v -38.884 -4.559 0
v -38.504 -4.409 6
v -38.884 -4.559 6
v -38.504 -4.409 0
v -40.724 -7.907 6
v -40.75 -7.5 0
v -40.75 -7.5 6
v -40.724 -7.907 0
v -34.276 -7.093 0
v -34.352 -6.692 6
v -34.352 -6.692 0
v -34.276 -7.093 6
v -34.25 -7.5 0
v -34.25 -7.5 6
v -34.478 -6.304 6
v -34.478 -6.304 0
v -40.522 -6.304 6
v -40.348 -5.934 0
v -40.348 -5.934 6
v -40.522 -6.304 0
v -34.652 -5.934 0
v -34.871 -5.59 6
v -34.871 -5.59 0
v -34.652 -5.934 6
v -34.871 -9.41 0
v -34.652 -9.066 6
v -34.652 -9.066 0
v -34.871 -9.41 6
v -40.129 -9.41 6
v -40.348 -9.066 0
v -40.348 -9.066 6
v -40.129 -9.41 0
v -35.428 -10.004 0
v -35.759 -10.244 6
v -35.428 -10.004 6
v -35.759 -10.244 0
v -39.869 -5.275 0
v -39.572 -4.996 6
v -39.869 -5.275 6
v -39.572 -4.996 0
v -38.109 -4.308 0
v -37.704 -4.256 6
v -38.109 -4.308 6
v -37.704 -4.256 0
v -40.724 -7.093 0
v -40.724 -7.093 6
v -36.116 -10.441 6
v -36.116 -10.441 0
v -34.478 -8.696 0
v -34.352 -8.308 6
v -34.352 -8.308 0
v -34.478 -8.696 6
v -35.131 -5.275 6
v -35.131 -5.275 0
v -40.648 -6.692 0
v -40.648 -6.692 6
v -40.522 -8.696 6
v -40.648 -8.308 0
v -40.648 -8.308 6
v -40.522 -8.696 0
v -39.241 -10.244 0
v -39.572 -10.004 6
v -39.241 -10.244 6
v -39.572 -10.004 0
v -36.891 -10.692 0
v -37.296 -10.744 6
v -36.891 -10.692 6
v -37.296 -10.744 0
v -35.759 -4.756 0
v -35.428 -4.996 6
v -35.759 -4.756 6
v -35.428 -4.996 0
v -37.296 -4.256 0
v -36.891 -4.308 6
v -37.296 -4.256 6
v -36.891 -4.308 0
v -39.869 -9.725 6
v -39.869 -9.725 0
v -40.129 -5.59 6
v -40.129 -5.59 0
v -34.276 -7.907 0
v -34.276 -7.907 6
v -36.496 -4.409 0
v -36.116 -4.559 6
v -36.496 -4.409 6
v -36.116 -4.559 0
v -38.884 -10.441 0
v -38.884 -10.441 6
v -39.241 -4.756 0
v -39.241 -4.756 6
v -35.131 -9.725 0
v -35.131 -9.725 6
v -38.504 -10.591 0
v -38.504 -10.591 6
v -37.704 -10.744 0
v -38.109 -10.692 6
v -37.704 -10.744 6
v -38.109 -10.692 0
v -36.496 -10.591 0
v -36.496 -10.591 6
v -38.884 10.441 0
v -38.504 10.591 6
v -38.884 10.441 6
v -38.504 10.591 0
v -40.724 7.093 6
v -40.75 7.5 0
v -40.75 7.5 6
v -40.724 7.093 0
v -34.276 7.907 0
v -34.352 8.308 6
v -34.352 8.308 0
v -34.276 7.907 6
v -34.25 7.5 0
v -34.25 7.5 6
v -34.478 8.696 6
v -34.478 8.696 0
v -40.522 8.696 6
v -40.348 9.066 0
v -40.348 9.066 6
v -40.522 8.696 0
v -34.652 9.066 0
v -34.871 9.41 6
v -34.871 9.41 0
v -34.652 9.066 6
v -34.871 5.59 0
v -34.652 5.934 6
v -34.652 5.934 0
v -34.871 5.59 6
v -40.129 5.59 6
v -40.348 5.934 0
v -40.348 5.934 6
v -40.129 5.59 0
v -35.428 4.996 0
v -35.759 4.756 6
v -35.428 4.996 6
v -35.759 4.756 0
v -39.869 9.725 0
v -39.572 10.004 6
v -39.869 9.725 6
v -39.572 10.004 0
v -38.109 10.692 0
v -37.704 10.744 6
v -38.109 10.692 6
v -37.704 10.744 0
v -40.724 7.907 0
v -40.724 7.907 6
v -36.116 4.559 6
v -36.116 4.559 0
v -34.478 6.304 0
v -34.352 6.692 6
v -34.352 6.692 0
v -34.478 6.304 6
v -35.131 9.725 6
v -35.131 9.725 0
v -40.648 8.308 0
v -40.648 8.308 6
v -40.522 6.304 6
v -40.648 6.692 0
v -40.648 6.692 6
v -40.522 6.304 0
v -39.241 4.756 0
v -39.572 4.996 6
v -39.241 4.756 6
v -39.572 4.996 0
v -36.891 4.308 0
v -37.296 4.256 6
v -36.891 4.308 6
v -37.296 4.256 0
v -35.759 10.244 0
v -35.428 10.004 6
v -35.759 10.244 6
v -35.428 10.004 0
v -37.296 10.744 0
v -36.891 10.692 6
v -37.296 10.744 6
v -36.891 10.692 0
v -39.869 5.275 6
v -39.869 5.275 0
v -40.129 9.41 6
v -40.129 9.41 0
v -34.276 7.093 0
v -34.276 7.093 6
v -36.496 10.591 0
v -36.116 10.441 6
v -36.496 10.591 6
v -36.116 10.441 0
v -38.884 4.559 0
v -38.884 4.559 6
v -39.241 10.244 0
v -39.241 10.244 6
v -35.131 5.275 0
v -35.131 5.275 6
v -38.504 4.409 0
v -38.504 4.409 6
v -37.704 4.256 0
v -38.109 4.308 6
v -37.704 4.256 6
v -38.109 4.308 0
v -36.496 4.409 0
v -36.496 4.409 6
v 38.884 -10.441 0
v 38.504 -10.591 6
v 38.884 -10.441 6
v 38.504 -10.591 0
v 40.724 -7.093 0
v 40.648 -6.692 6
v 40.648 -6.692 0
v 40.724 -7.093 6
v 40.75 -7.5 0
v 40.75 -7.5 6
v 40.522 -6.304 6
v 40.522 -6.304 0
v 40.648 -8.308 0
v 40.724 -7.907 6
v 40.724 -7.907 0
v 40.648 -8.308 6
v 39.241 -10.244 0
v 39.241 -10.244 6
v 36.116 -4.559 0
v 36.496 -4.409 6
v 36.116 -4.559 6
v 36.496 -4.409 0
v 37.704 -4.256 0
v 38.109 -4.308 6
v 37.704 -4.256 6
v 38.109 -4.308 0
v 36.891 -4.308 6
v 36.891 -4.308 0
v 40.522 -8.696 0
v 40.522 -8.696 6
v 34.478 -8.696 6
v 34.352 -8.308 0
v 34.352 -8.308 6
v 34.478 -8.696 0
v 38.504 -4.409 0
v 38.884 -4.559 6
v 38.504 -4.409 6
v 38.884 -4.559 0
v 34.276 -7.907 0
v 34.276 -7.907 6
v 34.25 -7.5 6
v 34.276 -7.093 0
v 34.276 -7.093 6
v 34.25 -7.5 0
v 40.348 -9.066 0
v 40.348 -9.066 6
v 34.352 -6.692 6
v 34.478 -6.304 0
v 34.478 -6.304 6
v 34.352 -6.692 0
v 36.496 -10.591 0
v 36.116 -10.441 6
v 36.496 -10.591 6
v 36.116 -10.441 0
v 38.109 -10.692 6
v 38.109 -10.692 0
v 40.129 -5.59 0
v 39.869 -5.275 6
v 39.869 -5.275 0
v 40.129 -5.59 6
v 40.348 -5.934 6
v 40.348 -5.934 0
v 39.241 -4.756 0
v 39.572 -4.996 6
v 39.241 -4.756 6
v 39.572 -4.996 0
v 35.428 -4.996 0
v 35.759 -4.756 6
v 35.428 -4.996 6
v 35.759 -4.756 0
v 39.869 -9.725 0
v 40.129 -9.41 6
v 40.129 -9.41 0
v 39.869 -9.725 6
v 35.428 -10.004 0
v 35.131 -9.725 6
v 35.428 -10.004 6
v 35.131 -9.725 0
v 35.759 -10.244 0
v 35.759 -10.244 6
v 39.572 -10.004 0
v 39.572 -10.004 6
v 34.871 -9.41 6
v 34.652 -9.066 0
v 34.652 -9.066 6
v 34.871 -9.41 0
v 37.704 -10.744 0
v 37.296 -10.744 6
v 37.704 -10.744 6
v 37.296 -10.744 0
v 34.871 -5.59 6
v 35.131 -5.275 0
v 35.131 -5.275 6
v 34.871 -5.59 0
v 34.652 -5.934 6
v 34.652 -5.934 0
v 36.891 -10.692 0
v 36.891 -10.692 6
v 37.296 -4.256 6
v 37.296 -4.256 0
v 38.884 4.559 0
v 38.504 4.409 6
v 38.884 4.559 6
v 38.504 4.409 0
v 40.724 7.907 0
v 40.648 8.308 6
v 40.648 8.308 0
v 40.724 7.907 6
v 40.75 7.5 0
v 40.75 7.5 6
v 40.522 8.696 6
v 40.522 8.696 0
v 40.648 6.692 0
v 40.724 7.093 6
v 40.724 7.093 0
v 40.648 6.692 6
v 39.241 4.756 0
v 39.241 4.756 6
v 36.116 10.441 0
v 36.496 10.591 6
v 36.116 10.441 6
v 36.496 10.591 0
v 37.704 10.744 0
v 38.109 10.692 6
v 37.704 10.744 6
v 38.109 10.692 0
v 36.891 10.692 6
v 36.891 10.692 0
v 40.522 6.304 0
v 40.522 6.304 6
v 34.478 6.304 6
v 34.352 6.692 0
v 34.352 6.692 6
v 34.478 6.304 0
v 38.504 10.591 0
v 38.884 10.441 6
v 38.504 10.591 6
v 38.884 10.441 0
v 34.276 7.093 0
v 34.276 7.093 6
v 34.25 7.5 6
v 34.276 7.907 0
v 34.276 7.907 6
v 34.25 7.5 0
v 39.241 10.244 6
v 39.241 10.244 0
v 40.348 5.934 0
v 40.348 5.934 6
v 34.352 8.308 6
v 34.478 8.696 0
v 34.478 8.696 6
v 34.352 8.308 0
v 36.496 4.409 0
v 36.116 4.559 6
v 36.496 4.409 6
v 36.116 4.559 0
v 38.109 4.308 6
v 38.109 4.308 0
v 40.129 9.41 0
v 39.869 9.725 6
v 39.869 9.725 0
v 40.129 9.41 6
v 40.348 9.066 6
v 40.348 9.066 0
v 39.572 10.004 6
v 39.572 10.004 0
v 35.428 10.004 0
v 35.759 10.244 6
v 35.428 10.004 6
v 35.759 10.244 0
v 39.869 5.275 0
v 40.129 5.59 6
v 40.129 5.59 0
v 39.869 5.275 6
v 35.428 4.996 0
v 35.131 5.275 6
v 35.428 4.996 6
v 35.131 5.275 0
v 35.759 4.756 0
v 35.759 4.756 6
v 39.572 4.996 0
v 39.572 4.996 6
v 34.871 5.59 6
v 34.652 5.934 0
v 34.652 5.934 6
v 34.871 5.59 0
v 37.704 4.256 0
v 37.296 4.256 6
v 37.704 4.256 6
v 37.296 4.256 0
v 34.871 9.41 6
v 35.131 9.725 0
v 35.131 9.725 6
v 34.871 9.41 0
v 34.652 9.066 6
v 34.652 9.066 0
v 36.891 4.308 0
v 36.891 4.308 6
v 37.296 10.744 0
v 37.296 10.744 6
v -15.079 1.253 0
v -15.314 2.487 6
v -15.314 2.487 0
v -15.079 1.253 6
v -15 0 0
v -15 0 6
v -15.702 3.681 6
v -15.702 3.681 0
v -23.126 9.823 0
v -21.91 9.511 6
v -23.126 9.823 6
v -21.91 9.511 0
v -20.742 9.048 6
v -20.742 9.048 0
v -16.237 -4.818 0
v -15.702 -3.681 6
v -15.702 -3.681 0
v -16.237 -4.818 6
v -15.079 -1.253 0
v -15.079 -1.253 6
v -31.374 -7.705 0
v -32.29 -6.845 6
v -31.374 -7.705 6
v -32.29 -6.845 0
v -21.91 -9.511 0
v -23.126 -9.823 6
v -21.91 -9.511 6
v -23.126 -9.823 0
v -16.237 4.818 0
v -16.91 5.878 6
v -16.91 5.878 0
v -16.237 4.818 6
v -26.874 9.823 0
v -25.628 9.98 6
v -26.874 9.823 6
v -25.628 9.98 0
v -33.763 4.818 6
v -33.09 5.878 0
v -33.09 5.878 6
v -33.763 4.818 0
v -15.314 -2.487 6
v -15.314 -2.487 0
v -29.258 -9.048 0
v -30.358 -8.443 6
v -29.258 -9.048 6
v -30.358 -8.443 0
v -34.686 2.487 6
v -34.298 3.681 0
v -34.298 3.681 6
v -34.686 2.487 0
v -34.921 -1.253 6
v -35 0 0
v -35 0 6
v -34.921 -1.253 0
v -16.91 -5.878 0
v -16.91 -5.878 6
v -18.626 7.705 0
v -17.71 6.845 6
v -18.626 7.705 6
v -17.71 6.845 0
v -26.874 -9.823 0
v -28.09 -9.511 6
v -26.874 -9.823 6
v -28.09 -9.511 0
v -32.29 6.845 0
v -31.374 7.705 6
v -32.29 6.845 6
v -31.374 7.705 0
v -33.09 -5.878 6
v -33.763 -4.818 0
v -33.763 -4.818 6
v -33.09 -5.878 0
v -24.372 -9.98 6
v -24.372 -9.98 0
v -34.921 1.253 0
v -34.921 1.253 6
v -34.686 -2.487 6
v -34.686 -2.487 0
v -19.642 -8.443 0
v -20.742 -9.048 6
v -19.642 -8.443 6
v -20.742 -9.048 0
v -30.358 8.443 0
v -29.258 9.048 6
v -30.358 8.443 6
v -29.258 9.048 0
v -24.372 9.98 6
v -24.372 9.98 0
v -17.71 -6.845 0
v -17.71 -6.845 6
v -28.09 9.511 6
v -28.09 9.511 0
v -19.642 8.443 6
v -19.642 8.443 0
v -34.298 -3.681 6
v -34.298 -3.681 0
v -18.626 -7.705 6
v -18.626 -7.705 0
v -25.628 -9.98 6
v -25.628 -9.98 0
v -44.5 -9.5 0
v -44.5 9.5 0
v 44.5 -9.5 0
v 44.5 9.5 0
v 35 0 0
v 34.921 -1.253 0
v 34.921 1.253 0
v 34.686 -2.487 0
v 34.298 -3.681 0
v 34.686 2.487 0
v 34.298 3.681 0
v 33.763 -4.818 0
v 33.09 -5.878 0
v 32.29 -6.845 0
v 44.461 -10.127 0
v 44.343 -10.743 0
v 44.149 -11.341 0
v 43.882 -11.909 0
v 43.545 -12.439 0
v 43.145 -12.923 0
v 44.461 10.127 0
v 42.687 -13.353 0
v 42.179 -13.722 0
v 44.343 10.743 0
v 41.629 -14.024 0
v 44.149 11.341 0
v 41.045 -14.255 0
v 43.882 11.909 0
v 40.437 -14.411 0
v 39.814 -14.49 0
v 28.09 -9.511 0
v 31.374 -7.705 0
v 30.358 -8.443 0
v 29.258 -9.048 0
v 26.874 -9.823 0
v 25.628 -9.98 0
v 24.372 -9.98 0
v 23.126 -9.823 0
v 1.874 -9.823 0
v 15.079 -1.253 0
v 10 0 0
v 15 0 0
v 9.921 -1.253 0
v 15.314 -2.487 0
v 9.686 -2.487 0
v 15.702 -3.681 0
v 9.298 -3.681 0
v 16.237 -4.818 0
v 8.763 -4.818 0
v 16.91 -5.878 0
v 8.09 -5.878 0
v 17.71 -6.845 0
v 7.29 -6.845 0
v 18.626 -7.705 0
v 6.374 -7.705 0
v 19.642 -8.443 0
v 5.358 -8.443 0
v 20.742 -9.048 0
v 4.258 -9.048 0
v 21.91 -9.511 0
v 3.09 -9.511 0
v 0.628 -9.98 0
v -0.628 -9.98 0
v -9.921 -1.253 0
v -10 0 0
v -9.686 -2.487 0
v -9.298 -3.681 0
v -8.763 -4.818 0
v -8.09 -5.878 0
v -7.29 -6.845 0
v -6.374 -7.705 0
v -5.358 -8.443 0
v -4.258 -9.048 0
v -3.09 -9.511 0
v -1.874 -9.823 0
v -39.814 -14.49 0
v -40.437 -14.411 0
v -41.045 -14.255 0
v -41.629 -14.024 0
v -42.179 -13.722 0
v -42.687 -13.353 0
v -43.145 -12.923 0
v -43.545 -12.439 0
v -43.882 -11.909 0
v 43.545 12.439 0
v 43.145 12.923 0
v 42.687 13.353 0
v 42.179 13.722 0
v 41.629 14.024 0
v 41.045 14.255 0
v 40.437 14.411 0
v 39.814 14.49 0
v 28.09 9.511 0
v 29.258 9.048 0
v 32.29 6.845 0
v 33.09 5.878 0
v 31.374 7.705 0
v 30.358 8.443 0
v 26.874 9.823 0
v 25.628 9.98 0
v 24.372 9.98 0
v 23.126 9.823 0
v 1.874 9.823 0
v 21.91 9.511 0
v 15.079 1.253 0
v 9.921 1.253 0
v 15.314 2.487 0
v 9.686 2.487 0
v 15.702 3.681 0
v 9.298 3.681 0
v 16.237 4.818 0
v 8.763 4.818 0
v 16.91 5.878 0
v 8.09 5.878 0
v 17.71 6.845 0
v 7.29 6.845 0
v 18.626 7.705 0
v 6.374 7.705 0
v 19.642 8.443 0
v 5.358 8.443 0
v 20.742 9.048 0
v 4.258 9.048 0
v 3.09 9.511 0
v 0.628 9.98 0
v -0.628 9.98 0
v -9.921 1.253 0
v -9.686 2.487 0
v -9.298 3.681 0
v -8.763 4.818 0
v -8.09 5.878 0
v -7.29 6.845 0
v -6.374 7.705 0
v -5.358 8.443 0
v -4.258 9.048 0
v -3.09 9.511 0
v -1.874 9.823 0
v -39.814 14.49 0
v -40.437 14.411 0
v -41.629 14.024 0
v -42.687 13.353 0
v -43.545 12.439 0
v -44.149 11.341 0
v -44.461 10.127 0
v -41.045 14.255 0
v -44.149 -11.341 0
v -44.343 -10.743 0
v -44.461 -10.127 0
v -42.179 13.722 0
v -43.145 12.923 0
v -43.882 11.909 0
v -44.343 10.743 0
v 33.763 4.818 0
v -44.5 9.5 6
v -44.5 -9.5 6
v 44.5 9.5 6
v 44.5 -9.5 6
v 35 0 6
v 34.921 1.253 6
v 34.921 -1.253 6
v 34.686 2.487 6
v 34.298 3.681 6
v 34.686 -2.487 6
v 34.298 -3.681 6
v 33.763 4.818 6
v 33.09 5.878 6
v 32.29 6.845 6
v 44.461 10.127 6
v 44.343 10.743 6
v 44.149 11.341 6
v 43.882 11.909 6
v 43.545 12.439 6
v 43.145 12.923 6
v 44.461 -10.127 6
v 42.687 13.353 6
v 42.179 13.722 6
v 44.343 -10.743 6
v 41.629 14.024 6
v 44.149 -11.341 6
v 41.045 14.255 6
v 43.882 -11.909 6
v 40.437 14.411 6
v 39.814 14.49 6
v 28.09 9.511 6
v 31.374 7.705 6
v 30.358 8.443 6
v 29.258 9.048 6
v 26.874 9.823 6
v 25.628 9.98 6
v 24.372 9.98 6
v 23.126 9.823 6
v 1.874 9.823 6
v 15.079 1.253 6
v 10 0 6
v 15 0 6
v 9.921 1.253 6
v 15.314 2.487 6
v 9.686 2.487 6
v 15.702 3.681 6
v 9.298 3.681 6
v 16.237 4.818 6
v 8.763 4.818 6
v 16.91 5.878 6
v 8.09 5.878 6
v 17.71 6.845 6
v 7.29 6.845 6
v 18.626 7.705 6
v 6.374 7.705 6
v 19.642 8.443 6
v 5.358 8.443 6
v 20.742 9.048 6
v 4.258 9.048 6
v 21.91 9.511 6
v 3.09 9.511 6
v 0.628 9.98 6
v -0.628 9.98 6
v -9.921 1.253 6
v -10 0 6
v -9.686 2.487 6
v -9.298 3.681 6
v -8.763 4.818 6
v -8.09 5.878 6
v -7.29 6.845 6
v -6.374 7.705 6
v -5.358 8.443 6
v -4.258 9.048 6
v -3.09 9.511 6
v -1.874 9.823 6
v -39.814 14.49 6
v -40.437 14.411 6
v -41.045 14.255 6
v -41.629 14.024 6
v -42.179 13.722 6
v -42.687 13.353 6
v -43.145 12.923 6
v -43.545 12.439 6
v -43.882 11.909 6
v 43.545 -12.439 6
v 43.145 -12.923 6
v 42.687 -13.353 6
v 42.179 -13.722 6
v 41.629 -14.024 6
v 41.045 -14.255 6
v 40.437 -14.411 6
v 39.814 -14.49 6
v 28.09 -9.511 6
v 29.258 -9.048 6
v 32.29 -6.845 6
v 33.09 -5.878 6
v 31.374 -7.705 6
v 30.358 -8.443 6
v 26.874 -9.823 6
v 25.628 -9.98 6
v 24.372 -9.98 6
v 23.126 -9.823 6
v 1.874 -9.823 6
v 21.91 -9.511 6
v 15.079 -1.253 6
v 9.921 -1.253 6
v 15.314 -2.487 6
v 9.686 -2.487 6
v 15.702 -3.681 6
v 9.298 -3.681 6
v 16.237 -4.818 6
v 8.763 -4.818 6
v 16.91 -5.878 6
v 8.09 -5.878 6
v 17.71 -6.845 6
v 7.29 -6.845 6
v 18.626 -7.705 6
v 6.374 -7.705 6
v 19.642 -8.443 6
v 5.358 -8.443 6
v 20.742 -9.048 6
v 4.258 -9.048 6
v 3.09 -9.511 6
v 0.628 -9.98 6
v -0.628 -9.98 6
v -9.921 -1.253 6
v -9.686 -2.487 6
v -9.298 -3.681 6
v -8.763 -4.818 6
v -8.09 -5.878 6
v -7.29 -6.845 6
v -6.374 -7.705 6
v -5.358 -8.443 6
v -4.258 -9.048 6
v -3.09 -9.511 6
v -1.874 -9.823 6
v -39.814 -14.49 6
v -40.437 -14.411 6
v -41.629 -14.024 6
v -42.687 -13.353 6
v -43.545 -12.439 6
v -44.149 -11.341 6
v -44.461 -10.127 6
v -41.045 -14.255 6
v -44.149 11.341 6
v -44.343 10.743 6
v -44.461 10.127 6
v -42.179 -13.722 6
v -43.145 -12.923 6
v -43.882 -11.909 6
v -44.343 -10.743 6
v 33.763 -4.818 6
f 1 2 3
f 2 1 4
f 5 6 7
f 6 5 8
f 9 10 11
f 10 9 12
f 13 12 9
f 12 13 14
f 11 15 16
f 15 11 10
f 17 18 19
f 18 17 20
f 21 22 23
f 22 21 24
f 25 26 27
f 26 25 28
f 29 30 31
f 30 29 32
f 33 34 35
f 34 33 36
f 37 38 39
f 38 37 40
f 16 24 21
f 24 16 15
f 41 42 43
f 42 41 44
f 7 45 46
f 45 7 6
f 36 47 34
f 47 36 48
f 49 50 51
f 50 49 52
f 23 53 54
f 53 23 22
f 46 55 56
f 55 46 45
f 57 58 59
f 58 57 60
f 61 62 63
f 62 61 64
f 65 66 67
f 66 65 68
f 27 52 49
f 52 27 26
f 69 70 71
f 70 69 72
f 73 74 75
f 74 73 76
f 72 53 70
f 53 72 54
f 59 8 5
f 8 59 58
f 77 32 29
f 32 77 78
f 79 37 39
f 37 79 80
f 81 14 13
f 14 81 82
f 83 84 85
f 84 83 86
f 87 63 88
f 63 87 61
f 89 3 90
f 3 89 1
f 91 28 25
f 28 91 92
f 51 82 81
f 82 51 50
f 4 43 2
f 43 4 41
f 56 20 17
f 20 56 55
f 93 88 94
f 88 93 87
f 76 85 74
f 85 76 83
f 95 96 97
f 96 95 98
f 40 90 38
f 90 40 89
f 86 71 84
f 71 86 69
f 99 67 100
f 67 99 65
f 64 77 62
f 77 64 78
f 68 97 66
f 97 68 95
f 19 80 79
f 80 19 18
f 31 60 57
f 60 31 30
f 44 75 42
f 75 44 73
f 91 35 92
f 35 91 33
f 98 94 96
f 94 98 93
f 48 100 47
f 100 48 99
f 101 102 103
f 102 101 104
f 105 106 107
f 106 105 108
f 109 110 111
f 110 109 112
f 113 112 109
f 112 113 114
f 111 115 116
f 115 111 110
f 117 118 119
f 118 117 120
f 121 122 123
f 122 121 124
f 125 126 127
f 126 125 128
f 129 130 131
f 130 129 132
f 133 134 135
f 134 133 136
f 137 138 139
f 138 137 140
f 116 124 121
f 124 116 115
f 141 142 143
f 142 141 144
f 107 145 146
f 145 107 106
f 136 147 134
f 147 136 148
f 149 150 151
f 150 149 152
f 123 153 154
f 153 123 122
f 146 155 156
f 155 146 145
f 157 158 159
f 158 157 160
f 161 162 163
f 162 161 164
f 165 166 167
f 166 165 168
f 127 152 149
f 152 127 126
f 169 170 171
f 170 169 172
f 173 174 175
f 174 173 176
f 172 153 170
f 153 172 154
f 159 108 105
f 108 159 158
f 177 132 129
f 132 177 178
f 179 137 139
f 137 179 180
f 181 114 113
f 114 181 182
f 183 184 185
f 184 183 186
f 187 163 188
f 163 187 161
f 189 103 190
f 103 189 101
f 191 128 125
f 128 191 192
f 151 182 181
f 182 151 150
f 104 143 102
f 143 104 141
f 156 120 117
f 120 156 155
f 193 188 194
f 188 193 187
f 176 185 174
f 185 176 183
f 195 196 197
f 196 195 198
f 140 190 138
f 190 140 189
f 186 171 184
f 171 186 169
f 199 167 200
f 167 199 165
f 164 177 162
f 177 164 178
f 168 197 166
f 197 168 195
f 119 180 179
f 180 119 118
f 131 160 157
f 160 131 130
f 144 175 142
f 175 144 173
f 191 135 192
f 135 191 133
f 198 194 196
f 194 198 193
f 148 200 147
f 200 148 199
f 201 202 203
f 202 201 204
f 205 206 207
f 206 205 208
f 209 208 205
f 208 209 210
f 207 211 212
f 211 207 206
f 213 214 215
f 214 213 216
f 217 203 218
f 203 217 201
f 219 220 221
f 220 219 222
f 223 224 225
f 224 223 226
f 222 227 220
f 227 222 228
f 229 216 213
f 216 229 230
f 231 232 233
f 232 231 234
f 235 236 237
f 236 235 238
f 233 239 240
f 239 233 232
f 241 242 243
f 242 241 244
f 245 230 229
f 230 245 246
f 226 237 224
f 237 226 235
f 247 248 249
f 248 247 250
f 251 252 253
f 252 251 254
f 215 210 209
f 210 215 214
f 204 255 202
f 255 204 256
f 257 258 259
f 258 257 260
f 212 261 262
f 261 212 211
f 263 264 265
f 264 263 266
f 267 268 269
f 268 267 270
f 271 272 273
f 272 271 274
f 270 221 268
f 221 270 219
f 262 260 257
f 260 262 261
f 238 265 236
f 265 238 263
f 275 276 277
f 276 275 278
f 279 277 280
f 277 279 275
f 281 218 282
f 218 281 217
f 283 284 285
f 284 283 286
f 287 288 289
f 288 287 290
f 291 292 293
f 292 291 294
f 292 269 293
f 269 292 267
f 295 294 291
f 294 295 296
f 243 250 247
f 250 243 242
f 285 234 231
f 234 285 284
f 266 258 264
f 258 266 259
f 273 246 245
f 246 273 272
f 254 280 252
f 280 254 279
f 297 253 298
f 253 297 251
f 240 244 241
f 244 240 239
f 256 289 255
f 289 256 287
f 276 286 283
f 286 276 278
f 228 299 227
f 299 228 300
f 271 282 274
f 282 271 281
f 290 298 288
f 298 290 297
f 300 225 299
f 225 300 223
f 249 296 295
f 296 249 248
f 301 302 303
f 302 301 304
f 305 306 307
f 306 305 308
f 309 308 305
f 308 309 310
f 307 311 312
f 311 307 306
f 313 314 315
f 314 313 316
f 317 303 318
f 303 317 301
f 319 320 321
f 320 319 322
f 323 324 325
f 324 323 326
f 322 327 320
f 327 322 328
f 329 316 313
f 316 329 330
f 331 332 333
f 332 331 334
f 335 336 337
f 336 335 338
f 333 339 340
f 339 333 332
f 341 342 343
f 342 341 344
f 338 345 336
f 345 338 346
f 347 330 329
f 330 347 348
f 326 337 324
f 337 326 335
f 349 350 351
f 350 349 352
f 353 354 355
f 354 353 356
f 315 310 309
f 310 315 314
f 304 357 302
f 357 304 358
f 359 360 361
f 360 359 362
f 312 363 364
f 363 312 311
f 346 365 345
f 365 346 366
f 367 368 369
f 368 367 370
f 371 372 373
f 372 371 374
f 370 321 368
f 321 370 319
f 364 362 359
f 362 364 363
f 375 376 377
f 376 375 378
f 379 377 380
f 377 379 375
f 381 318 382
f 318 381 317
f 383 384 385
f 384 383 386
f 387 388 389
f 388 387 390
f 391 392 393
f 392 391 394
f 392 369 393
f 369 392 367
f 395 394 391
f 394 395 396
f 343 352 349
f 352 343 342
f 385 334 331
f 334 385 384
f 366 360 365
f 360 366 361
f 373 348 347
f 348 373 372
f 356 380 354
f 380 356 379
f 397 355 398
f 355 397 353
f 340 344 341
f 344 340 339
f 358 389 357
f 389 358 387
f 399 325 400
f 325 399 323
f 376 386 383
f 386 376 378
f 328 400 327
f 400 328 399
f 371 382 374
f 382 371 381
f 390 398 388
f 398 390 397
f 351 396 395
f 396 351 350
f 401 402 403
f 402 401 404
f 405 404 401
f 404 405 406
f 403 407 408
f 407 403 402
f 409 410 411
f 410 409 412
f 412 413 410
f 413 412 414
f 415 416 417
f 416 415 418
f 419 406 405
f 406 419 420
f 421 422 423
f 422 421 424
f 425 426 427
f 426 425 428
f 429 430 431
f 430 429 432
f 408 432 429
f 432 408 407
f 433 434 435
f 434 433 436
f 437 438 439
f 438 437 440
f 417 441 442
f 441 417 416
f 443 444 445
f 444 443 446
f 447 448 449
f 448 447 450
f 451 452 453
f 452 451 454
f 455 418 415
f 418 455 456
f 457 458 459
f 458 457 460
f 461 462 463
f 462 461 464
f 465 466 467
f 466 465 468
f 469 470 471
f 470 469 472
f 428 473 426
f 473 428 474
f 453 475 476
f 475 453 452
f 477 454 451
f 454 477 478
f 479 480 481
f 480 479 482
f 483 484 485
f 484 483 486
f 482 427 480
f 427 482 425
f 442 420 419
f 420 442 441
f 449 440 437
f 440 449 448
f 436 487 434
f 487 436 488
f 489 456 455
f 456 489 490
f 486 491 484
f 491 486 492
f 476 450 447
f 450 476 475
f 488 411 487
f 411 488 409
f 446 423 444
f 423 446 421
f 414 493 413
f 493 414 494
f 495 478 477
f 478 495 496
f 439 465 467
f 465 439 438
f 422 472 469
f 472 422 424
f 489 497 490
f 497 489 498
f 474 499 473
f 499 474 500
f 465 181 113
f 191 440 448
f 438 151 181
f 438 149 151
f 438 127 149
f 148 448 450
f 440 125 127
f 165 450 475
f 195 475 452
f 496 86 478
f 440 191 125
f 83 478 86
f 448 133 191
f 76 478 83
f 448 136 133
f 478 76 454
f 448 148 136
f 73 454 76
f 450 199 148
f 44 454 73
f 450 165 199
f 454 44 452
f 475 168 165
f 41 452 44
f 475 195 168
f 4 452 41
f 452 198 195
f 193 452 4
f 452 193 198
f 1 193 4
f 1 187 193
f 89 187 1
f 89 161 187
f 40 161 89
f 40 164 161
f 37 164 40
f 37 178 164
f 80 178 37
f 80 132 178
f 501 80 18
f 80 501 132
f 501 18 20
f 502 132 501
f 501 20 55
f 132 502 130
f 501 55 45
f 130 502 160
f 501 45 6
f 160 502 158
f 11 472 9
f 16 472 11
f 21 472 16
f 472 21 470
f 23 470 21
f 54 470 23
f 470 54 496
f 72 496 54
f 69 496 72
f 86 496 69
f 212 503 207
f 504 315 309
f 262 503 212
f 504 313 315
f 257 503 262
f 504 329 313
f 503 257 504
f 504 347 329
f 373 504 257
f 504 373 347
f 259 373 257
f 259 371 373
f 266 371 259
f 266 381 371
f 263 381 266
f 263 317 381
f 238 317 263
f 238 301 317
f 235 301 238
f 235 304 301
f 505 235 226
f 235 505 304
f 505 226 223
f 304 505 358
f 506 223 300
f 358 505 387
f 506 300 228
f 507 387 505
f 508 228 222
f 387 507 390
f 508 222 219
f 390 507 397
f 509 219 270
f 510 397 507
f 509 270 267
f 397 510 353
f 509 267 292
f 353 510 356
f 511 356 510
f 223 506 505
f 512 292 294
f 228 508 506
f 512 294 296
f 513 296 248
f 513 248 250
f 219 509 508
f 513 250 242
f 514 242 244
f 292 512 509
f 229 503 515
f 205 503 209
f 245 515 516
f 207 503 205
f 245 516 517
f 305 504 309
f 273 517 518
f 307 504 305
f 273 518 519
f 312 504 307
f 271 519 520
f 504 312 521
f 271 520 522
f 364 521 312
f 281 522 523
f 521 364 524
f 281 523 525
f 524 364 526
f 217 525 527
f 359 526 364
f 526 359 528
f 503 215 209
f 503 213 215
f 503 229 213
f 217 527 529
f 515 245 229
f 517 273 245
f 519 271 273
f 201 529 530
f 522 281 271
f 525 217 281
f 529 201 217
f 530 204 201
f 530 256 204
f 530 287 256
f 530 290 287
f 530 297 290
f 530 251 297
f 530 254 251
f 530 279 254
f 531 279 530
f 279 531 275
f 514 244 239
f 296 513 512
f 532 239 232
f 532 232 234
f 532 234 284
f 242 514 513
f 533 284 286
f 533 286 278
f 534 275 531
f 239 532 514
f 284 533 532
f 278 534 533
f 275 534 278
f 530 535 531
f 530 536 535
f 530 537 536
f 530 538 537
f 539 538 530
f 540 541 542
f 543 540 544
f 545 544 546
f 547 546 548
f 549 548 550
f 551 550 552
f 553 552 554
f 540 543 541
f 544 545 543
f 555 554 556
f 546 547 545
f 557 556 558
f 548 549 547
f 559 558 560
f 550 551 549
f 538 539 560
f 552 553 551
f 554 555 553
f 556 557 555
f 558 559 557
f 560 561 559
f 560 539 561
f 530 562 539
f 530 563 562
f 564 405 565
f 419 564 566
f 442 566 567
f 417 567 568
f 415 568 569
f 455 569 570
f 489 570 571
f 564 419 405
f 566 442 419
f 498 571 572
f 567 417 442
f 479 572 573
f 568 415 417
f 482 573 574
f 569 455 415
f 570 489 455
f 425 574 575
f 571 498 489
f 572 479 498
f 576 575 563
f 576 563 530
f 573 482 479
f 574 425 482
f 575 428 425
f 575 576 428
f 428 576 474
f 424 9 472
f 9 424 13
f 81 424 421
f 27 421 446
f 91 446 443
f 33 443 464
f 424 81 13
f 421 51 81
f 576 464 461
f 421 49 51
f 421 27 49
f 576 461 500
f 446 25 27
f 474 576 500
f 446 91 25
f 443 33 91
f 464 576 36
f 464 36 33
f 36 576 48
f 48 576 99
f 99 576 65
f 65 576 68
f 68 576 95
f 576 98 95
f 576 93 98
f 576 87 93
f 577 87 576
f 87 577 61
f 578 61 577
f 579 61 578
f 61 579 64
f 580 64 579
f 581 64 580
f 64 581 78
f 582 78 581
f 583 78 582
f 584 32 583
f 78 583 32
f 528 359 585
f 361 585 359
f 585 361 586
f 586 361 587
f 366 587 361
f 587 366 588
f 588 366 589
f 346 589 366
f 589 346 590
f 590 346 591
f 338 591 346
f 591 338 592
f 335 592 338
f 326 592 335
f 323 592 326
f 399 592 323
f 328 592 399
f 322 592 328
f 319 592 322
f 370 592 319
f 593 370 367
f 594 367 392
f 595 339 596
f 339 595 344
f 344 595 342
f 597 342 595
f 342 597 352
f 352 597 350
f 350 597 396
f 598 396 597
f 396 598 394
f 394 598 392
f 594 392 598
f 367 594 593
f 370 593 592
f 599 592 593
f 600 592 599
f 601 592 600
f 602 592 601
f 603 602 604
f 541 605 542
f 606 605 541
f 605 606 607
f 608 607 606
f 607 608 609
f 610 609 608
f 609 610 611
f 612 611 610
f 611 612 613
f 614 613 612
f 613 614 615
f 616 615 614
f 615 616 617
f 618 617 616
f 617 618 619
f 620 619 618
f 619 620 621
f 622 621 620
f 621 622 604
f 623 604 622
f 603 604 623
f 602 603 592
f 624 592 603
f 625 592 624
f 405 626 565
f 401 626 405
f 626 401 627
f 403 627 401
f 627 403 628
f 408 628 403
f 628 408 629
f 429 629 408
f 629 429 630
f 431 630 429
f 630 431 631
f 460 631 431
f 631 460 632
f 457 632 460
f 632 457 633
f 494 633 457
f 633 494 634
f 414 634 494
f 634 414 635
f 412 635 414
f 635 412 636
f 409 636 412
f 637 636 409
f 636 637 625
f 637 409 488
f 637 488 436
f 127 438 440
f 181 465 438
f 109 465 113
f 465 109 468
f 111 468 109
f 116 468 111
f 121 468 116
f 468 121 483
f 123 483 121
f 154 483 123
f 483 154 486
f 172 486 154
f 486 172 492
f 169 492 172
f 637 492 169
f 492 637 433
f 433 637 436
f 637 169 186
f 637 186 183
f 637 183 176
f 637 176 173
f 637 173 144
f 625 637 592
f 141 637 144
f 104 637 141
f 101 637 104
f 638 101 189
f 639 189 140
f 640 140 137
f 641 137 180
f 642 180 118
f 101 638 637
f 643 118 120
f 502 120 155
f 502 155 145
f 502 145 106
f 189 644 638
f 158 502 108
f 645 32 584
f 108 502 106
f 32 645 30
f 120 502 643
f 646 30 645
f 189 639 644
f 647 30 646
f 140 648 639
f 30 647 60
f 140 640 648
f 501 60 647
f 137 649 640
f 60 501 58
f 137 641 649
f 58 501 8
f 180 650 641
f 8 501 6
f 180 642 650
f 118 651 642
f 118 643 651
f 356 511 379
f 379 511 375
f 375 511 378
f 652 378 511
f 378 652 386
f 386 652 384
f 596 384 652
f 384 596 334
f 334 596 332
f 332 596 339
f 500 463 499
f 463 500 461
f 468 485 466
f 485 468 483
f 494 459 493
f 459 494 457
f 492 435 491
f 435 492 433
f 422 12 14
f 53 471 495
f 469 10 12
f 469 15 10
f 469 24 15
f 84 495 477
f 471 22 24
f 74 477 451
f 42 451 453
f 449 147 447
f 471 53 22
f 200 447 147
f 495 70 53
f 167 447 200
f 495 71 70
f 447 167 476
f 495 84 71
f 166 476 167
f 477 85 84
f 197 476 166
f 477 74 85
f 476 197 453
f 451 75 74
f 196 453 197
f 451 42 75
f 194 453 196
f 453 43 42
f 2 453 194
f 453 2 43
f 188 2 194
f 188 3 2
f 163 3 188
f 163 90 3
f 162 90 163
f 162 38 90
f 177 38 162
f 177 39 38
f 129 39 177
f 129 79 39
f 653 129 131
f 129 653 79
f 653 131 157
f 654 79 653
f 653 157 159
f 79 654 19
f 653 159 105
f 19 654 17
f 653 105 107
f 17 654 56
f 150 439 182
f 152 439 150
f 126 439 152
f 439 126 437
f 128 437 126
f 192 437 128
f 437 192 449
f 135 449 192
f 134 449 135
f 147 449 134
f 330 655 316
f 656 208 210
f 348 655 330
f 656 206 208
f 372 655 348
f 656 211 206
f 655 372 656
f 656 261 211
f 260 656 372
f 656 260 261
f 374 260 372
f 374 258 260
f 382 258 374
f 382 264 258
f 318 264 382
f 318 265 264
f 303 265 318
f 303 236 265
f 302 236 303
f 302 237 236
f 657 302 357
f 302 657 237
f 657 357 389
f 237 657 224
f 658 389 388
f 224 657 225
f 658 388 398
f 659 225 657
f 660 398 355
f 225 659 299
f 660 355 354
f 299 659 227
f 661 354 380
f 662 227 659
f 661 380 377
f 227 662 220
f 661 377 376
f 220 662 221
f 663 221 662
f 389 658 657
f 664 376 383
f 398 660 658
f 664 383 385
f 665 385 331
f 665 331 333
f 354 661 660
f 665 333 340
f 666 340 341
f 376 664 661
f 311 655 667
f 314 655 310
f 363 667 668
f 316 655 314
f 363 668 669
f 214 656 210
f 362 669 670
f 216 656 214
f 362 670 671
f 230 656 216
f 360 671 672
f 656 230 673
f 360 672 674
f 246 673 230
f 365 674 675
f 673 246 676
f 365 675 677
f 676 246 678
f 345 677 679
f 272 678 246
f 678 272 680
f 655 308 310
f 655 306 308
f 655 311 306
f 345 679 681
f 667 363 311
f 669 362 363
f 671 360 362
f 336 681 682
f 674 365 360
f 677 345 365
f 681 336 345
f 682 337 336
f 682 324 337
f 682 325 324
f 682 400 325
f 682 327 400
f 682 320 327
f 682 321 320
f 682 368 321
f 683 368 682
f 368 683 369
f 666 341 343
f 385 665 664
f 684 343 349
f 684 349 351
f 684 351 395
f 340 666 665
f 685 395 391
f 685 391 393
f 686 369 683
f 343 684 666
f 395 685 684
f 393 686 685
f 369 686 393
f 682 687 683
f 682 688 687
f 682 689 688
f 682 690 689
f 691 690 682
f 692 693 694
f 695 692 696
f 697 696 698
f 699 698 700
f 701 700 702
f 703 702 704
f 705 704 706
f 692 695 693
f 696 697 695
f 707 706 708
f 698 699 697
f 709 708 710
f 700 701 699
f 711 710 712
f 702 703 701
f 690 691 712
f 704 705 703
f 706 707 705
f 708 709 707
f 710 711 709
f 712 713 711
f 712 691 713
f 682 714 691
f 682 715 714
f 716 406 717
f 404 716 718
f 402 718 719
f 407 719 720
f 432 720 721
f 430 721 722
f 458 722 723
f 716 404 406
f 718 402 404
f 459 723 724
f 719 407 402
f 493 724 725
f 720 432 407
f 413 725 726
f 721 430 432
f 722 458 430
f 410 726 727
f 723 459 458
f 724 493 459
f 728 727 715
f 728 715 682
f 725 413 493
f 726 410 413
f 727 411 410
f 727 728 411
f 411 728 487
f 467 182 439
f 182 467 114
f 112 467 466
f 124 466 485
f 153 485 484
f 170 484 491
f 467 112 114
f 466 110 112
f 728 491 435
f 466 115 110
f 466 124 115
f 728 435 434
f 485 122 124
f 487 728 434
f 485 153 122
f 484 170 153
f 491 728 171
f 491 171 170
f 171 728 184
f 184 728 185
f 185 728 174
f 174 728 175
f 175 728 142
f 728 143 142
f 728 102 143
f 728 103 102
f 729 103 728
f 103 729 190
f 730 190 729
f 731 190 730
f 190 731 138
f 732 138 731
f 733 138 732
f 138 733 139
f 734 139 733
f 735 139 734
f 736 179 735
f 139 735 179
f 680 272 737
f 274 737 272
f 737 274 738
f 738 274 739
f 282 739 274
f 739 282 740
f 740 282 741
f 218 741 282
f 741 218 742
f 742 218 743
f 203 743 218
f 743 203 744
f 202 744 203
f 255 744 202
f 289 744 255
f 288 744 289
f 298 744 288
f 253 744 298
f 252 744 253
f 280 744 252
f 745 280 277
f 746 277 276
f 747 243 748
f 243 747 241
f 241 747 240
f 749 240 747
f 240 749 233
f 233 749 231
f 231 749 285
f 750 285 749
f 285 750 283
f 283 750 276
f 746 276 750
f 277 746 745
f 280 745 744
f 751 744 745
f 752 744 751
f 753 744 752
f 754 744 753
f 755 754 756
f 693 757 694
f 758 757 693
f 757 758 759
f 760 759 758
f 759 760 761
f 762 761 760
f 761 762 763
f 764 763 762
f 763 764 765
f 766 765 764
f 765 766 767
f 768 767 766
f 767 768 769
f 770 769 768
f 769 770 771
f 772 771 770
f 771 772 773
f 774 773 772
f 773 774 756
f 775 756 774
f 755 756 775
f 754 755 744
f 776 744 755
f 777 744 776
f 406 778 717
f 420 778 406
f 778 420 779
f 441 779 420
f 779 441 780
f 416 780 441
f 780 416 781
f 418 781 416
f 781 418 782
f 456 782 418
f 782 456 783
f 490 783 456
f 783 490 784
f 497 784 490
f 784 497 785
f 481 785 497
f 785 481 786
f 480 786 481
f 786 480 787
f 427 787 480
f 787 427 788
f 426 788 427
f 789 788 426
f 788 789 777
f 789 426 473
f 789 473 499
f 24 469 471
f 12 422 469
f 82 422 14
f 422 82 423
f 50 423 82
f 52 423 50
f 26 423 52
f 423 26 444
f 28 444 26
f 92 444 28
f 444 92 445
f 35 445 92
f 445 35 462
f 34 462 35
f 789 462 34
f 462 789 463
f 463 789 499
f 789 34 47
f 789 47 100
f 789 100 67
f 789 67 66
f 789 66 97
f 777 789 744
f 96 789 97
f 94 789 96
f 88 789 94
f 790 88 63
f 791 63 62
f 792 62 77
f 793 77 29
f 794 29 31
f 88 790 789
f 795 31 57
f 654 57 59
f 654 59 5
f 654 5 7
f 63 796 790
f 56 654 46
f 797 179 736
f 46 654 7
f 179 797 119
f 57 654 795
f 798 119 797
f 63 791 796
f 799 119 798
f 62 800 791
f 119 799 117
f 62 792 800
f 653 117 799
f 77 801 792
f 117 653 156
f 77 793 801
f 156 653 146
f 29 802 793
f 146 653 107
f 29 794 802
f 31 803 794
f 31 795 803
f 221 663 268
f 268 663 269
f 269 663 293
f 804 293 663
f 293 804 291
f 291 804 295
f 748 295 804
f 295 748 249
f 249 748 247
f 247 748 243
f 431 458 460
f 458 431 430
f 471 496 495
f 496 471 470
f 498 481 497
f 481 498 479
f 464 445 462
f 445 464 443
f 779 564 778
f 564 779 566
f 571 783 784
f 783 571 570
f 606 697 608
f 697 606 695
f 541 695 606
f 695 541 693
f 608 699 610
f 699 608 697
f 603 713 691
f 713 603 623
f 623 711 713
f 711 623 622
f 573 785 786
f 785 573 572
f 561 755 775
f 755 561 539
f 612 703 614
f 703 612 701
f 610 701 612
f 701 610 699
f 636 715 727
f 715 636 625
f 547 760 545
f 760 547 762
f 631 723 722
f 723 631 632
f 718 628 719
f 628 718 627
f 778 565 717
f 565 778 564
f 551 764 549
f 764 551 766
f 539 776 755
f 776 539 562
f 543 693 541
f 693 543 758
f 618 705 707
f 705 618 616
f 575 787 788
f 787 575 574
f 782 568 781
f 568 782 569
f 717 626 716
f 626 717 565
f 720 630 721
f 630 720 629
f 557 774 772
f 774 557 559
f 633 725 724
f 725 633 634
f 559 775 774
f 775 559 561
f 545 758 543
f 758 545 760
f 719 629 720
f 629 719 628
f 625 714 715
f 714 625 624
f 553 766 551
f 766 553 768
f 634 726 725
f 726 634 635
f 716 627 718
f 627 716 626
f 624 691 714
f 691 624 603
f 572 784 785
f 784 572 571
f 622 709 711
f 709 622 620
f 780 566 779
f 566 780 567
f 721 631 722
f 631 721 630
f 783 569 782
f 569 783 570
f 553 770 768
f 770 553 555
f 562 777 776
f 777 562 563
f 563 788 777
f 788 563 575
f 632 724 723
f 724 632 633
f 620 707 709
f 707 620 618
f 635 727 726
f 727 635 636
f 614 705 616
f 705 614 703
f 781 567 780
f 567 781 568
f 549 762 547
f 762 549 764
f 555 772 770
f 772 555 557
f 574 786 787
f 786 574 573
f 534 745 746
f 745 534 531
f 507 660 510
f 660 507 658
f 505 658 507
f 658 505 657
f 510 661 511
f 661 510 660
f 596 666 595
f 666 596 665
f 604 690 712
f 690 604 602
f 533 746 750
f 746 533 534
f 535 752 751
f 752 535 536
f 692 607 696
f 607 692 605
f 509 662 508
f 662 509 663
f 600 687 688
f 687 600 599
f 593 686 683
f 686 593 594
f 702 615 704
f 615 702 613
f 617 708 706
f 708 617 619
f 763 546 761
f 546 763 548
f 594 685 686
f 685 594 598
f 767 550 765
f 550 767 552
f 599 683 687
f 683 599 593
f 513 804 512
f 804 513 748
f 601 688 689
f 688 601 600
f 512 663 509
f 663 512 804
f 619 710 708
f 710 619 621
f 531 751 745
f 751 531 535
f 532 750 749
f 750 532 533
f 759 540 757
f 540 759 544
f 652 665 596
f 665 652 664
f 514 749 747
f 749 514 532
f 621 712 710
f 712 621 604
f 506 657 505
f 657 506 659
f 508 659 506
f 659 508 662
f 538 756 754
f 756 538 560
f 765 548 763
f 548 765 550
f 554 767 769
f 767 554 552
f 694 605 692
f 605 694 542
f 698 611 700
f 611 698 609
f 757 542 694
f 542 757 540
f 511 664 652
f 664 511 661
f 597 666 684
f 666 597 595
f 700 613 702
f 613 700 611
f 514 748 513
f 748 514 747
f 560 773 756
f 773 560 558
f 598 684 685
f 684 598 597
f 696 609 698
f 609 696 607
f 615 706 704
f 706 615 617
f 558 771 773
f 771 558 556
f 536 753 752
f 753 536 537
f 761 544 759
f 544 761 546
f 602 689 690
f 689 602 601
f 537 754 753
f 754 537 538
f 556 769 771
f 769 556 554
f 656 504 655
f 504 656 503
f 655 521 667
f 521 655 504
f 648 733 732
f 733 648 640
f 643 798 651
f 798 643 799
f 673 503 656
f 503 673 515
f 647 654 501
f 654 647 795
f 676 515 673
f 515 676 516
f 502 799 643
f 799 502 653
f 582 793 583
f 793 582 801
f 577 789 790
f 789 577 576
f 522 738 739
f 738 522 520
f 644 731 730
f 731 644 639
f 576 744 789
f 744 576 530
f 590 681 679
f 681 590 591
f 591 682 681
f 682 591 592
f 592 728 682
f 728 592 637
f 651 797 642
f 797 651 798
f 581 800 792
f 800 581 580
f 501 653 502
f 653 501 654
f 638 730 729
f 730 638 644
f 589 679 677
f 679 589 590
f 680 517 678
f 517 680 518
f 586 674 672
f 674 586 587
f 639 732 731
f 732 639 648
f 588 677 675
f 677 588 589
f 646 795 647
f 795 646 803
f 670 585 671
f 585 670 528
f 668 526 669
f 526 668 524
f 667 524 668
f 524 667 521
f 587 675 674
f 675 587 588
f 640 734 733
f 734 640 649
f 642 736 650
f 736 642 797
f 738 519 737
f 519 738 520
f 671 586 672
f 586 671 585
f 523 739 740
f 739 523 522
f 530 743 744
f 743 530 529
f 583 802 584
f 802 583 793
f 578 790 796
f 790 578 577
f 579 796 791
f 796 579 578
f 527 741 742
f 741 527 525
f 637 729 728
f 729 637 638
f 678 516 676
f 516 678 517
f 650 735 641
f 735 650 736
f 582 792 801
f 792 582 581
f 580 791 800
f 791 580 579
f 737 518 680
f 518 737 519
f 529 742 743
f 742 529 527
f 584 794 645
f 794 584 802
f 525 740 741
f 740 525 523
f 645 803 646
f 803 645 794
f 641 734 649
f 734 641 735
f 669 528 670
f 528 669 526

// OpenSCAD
$fn = 50;

difference() {
	union() {
		hull() {
			translate(v = [-39.5, 9.5, 0]) {
				cylinder(h = 6, r = 5);
			}
			translate(v = [39.5, 9.5, 0]) {
				cylinder(h = 6, r = 5);
			}
			translate(v = [-39.5, -9.5, 0]) {
				cylinder(h = 6, r = 5);
			}
			translate(v = [39.5, -9.5, 0]) {
				cylinder(h = 6, r = 5);
			}
		}
	}
	union() {
		translate(v = [-37.5, -7.5, -100.0]) {
			cylinder(h = 200, r = 3.25);
		}
		translate(v = [-37.5, 7.5, -100.0]) {
			cylinder(h = 200, r = 3.25);
		}
		translate(v = [37.5, -7.5, -100.0]) {
			cylinder(h = 200, r = 3.25);
		}
		translate(v = [37.5, 7.5, -100.0]) {
			cylinder(h = 200, r = 3.25);
		}
		translate(v = [-37.5, -7.5, -100.0]) {
			cylinder(h = 200, r = 1.8);
		}
		translate(v = [-37.5, 7.5, -100.0]) {
			cylinder(h = 200, r = 1.8);
		}
		translate(v = [37.5, -7.5, -100.0]) {
			cylinder(h = 200, r = 1.8);
		}
		translate(v = [37.5, 7.5, -100.0]) {
			cylinder(h = 200, r = 1.8);
		}
		translate(v = [-25.0, 0, 0.0]) {
			cylinder(h = 6, r = 10.0);
		}
		cylinder(h = 6, r = 10.0);
		translate(v = [25.0, 0, 0.0]) {
			cylinder(h = 6, r = 10.0);
		}
	}
}
